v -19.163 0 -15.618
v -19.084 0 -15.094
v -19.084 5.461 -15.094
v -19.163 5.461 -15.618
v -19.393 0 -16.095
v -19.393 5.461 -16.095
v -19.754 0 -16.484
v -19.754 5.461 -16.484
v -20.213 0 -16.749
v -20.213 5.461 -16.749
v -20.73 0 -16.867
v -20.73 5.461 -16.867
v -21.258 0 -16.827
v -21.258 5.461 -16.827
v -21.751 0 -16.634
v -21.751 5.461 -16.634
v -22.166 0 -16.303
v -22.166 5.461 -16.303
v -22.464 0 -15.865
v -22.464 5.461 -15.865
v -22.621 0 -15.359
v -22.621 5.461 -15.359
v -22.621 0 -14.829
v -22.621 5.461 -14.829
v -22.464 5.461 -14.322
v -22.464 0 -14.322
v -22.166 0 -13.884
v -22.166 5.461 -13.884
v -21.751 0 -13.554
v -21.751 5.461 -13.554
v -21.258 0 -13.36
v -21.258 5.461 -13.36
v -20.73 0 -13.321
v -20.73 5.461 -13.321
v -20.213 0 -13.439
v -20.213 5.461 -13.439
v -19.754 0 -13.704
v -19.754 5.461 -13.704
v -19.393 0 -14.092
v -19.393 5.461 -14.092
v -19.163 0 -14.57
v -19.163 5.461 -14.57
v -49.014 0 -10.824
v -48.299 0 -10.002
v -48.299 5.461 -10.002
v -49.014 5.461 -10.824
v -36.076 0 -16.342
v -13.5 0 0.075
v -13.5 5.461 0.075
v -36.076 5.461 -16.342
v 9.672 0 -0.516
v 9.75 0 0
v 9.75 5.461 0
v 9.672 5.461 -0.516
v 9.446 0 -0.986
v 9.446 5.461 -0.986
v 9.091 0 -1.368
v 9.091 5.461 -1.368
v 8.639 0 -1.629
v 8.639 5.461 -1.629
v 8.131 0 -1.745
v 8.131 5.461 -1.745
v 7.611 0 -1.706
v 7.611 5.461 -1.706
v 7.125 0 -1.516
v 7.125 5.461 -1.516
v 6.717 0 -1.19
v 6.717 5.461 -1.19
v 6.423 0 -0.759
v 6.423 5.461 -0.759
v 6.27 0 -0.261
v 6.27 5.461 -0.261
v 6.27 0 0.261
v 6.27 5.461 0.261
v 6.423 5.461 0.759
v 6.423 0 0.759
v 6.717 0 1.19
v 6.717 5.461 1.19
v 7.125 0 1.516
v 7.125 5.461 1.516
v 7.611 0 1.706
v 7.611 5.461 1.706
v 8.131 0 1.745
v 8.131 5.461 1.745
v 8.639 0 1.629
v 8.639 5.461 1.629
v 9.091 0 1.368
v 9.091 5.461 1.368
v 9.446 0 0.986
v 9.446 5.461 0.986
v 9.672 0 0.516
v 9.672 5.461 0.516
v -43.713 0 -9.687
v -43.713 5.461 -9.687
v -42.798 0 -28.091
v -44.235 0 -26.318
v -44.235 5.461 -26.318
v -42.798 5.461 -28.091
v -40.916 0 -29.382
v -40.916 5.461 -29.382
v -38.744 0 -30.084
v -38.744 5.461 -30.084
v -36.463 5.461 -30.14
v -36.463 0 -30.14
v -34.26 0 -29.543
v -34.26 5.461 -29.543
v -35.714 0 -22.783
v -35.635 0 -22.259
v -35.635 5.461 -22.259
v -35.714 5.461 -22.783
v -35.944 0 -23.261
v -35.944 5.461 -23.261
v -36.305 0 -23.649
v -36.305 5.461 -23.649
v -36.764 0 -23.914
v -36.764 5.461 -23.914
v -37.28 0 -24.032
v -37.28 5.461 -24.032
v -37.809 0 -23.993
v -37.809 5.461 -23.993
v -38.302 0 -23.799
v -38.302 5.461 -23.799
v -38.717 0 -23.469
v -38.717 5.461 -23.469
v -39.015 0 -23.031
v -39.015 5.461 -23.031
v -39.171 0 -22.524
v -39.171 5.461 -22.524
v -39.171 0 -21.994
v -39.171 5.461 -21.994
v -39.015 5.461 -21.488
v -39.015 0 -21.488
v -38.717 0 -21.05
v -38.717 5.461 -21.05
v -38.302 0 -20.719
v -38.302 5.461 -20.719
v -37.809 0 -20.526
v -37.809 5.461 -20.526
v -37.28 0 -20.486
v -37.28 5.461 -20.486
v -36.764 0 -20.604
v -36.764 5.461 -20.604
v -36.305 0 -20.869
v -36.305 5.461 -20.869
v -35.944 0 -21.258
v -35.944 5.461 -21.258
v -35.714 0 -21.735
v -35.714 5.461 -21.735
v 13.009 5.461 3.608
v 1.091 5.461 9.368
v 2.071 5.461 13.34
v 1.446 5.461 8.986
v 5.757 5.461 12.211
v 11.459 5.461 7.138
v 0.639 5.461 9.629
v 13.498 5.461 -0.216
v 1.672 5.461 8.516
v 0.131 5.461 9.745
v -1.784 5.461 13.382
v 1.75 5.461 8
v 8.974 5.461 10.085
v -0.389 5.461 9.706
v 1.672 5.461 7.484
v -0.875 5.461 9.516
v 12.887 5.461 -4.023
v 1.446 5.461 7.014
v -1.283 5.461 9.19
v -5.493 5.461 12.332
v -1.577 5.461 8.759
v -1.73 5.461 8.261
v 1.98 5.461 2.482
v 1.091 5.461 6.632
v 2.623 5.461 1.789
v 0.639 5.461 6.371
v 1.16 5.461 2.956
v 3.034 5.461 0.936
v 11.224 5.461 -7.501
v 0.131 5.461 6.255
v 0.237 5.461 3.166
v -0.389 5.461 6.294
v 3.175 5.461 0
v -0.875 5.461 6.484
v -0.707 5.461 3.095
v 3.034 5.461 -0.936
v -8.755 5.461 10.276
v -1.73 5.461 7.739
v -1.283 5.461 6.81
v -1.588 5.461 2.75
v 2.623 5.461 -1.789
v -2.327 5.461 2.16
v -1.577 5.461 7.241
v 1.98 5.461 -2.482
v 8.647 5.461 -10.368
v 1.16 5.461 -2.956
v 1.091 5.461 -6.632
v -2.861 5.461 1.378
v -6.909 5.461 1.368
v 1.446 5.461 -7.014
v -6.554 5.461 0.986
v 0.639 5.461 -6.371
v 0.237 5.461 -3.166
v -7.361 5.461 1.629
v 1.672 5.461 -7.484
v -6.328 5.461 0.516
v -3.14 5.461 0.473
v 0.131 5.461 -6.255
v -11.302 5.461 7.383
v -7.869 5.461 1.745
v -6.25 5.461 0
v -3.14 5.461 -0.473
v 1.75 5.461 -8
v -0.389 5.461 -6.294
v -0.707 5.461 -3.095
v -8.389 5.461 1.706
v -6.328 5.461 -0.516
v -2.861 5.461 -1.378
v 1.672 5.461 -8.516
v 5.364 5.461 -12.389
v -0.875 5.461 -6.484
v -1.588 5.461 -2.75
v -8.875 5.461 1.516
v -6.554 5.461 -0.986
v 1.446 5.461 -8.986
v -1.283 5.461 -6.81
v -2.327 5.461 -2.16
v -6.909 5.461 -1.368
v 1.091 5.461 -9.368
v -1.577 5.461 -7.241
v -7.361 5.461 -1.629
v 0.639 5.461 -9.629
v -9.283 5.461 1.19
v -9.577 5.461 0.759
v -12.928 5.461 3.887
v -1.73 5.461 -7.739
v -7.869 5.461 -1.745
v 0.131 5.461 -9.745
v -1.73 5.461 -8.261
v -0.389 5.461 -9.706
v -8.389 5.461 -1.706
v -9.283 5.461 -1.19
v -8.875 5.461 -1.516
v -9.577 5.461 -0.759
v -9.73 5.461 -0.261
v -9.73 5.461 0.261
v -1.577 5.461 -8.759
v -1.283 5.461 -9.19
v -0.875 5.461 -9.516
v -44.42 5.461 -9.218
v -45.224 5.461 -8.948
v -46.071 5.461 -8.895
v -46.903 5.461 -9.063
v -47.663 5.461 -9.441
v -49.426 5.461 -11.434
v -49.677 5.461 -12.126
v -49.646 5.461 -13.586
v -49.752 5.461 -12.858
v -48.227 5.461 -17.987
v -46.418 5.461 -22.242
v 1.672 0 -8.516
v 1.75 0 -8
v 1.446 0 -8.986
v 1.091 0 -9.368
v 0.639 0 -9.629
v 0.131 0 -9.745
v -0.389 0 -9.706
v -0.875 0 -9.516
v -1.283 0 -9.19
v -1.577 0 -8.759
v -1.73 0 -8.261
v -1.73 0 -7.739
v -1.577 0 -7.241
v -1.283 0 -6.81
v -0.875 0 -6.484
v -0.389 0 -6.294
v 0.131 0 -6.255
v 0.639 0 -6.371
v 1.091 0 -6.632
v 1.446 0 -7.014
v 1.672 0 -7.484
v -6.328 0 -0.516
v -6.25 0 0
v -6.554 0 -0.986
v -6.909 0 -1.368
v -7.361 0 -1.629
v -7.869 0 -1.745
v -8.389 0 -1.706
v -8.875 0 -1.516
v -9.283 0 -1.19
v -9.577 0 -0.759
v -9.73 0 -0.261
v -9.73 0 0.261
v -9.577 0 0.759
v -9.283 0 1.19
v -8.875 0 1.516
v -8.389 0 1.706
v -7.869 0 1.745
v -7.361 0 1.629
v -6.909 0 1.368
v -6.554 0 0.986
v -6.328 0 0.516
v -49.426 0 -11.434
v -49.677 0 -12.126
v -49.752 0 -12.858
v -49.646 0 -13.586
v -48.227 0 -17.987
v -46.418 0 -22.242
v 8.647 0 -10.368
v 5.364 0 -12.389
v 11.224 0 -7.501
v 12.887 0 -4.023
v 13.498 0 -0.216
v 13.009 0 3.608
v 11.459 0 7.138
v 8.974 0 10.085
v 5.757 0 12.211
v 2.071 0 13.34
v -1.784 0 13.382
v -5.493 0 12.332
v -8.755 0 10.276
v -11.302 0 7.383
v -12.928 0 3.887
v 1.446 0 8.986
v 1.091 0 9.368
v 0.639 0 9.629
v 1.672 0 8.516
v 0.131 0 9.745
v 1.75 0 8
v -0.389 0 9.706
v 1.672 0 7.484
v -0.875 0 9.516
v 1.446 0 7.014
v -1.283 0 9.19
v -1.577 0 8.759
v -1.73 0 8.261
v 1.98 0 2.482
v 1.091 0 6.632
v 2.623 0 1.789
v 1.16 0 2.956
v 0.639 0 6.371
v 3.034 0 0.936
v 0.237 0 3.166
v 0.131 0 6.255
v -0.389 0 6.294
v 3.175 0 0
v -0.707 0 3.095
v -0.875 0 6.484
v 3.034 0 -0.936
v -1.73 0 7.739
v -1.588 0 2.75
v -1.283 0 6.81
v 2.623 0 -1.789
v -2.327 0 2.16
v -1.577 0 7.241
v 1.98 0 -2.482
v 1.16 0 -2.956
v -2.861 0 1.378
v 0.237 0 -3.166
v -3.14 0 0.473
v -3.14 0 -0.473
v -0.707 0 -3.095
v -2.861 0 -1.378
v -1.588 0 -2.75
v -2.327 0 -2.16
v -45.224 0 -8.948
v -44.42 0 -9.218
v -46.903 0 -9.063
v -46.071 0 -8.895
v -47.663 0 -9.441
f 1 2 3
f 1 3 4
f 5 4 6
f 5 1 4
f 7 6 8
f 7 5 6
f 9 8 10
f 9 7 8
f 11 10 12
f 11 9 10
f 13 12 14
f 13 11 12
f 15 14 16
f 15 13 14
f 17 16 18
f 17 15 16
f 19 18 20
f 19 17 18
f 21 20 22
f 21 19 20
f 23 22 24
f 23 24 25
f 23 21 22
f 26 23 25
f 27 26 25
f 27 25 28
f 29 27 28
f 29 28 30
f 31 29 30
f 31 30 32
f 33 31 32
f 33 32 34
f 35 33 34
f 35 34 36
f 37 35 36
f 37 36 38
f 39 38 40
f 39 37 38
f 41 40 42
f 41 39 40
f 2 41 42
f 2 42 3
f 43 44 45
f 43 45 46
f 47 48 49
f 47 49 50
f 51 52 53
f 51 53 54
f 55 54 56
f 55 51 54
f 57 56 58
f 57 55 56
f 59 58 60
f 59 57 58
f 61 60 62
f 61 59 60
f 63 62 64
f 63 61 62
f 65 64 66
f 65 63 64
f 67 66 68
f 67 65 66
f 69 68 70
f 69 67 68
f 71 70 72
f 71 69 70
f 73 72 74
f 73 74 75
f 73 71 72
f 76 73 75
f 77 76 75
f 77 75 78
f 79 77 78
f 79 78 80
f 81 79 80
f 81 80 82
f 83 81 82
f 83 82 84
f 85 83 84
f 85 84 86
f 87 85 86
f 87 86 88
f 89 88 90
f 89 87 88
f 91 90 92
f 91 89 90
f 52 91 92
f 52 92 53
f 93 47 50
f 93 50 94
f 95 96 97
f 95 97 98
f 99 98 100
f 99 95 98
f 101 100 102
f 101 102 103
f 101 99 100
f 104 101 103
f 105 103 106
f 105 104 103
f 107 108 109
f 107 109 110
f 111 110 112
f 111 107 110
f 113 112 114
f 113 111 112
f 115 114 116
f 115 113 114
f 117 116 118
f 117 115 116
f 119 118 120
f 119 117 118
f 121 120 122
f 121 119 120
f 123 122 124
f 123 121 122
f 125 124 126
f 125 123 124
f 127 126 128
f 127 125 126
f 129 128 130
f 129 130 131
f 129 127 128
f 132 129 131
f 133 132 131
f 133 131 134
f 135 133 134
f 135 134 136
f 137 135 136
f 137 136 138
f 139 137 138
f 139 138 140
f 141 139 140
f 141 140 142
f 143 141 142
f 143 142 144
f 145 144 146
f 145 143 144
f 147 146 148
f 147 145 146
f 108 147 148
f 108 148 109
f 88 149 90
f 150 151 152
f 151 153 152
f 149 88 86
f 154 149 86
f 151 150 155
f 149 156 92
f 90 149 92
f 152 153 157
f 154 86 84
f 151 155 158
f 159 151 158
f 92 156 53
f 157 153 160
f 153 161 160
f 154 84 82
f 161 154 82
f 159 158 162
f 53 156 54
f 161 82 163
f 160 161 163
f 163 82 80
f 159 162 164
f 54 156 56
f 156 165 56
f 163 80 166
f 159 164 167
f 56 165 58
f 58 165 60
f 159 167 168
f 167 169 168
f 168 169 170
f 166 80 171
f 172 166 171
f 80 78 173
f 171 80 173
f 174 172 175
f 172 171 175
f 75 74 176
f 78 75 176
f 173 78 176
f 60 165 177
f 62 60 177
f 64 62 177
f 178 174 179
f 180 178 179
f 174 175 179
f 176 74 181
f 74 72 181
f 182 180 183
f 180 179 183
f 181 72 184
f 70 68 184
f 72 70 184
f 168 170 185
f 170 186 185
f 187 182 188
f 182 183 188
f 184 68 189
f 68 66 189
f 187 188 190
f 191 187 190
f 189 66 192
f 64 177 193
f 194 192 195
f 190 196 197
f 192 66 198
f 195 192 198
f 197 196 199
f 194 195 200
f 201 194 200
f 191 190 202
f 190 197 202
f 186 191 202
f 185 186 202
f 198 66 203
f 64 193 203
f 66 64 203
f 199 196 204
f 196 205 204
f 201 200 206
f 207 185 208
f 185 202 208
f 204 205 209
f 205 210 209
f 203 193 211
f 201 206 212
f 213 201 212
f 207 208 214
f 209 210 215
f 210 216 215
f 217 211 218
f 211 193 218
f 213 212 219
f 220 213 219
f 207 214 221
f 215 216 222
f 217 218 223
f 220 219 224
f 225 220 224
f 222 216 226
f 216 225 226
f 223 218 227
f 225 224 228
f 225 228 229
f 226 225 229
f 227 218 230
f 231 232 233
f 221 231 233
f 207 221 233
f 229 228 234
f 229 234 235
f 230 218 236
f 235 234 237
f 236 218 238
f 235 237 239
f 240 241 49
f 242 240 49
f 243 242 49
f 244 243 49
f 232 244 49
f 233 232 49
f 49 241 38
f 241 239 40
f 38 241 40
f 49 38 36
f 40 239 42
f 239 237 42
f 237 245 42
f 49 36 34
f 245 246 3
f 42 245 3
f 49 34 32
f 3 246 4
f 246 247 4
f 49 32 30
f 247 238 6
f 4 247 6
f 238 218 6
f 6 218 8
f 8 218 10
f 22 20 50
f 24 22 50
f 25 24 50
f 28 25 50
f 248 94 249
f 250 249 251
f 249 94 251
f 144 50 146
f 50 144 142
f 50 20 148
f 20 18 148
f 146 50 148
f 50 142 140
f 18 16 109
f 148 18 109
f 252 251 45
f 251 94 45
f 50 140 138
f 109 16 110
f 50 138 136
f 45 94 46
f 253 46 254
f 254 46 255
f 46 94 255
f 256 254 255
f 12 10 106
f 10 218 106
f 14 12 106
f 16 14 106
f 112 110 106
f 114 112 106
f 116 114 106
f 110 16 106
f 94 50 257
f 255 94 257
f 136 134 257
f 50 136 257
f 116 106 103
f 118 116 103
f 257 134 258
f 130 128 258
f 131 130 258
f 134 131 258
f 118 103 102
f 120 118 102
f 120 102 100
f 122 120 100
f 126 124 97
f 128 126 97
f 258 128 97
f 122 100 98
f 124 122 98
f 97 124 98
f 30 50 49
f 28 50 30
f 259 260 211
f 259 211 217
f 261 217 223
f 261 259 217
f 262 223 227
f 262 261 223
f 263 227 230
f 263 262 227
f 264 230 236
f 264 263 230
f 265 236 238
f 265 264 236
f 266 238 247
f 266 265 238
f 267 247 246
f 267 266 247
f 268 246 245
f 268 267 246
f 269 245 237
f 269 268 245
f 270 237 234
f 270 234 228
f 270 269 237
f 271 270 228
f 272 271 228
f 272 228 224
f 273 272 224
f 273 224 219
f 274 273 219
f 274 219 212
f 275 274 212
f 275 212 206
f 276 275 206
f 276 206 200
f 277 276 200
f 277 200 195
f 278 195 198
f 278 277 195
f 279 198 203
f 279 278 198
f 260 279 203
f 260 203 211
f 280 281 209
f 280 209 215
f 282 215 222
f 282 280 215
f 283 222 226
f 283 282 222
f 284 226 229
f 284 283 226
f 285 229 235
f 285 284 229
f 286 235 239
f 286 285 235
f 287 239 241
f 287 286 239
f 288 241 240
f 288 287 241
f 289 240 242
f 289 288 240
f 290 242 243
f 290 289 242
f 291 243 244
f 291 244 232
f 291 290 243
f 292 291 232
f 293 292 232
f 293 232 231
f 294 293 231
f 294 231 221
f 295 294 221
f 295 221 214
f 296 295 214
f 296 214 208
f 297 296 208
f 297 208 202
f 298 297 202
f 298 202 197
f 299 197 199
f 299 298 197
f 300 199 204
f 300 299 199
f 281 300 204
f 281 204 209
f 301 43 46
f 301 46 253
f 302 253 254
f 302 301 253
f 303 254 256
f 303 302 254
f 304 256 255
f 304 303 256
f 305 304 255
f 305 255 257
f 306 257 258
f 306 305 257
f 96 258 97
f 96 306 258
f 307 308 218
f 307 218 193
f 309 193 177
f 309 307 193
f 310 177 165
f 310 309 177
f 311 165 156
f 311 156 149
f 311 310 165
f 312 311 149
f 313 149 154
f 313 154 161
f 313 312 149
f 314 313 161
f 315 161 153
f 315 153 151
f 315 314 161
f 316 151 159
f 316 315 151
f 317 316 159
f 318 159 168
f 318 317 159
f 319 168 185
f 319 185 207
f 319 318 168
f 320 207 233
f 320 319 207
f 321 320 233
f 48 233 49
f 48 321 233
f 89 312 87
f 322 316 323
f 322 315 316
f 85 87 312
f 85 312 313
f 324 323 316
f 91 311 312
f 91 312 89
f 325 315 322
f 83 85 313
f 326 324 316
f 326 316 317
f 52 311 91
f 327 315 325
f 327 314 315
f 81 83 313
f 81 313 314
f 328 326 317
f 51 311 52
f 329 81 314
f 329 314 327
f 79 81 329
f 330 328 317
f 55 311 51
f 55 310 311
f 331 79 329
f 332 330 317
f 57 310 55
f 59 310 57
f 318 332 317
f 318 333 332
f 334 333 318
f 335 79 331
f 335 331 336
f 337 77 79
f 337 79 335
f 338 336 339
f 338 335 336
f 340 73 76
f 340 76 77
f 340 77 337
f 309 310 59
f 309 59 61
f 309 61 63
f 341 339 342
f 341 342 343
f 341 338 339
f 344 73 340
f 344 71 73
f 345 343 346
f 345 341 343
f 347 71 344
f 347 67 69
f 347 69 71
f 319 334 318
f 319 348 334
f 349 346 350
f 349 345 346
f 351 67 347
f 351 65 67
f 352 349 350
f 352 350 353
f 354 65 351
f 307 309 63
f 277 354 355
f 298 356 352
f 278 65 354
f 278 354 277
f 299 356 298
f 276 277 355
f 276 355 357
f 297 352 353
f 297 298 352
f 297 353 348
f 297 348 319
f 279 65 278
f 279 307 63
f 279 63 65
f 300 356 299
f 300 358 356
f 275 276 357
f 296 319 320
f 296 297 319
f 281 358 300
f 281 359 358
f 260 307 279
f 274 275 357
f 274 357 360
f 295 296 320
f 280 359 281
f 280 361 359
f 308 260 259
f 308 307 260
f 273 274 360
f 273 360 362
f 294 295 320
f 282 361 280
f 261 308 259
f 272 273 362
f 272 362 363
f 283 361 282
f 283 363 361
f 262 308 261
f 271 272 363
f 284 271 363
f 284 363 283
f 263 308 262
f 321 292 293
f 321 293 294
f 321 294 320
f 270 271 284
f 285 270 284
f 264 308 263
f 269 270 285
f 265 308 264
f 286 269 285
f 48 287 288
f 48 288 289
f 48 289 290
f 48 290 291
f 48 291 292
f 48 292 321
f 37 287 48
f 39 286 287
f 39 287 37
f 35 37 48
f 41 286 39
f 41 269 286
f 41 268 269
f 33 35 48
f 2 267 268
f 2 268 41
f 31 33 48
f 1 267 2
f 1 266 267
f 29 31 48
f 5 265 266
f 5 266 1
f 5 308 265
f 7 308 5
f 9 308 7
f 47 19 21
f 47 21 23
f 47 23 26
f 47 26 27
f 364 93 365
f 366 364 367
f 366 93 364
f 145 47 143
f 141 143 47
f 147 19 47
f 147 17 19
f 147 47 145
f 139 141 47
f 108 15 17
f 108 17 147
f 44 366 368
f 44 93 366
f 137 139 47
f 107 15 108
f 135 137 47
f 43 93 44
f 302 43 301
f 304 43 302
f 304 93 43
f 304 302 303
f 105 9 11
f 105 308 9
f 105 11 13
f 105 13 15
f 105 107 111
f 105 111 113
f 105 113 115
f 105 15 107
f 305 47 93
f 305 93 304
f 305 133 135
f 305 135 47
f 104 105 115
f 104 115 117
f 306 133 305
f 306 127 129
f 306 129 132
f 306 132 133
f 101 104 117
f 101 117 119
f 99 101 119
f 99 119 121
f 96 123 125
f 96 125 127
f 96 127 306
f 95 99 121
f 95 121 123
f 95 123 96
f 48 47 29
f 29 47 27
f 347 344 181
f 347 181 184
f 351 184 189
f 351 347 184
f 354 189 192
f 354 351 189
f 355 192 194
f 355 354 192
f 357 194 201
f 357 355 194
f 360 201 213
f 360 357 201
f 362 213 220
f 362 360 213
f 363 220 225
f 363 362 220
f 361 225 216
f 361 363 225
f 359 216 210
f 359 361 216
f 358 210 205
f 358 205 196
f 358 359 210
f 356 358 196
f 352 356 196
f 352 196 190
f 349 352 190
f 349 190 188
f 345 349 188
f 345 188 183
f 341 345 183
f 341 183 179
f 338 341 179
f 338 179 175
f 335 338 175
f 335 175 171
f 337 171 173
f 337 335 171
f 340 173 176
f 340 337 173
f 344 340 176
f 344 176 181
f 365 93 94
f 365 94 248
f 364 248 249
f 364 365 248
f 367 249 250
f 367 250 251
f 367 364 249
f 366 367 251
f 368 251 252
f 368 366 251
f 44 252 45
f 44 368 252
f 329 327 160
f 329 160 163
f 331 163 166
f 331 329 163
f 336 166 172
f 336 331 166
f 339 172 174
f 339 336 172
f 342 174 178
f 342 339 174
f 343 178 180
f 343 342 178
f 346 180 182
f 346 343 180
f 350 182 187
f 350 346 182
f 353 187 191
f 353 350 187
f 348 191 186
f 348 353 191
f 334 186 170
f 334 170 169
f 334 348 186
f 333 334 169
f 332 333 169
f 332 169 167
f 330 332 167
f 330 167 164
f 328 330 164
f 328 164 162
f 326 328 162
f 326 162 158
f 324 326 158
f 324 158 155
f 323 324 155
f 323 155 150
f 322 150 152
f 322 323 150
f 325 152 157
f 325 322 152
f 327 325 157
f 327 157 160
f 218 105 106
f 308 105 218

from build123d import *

# Parameters (mm, degrees)
SKETCH1_R           = 1.75
SKETCH1_R_2         = 3.175
SKETCH1_R_3         = 1.778
BOSS_EXTRUDE1_DEPTH = 5.461


with BuildPart() as part:
    # Sketch1 → Boss-Extrude1 (new body)
    with BuildSketch(Plane(origin=(0, 0, 0), x_dir=(1, 0, 0), z_dir=(0, 1, 0))):
        with BuildLine():
            Line((-36.075553112, 16.34222836), (-43.713289862, 9.687095487))
            ThreePointArc((-43.713289862, 9.687095487), (-46.071262537, 8.895051227), (-48.298660873, 10.002329828))
            Line((-48.298660873, 10.002329828), (-49.01441114, 10.823757773))
            ThreePointArc((-49.01441114, 10.823757773), (-49.677098428, 12.125807852), (-49.646194202, 13.586469955))
            ThreePointArc((-49.646194202, 13.586469955), (-47.370124011, 20.134748964), (-44.234733225, 26.317772344))
            ThreePointArc((-44.234733225, 26.317772344), (-39.855484626, 29.811728531), (-34.259632886, 29.543416329))
            Line((-34.259632886, 29.543416329), (5.363638877, 12.388760148))
            ThreePointArc((5.363638877, 12.388760148), (7.44200849, -11.263503435), (-13.499793526, -0.074664302))
            Line((-13.499793526, -0.074664302), (-36.075553112, 16.34222836))
        make_face()
        with Locations((8, 0)):
            Circle(SKETCH1_R, mode=Mode.SUBTRACT)
        with Locations((0, -8)):
            Circle(SKETCH1_R, mode=Mode.SUBTRACT)
        with Locations((-8, 0)):
            Circle(SKETCH1_R, mode=Mode.SUBTRACT)
        with Locations((0, 8)):
            Circle(SKETCH1_R, mode=Mode.SUBTRACT)
        Circle(SKETCH1_R_2, mode=Mode.SUBTRACT)
        with Locations((-20.862458922, 15.093717491)):
            Circle(SKETCH1_R_3, mode=Mode.SUBTRACT)
        with Locations((-37.413253893, 22.259284205)):
            Circle(SKETCH1_R_3, mode=Mode.SUBTRACT)
    extrude(amount=BOSS_EXTRUDE1_DEPTH)


solid = part.part
